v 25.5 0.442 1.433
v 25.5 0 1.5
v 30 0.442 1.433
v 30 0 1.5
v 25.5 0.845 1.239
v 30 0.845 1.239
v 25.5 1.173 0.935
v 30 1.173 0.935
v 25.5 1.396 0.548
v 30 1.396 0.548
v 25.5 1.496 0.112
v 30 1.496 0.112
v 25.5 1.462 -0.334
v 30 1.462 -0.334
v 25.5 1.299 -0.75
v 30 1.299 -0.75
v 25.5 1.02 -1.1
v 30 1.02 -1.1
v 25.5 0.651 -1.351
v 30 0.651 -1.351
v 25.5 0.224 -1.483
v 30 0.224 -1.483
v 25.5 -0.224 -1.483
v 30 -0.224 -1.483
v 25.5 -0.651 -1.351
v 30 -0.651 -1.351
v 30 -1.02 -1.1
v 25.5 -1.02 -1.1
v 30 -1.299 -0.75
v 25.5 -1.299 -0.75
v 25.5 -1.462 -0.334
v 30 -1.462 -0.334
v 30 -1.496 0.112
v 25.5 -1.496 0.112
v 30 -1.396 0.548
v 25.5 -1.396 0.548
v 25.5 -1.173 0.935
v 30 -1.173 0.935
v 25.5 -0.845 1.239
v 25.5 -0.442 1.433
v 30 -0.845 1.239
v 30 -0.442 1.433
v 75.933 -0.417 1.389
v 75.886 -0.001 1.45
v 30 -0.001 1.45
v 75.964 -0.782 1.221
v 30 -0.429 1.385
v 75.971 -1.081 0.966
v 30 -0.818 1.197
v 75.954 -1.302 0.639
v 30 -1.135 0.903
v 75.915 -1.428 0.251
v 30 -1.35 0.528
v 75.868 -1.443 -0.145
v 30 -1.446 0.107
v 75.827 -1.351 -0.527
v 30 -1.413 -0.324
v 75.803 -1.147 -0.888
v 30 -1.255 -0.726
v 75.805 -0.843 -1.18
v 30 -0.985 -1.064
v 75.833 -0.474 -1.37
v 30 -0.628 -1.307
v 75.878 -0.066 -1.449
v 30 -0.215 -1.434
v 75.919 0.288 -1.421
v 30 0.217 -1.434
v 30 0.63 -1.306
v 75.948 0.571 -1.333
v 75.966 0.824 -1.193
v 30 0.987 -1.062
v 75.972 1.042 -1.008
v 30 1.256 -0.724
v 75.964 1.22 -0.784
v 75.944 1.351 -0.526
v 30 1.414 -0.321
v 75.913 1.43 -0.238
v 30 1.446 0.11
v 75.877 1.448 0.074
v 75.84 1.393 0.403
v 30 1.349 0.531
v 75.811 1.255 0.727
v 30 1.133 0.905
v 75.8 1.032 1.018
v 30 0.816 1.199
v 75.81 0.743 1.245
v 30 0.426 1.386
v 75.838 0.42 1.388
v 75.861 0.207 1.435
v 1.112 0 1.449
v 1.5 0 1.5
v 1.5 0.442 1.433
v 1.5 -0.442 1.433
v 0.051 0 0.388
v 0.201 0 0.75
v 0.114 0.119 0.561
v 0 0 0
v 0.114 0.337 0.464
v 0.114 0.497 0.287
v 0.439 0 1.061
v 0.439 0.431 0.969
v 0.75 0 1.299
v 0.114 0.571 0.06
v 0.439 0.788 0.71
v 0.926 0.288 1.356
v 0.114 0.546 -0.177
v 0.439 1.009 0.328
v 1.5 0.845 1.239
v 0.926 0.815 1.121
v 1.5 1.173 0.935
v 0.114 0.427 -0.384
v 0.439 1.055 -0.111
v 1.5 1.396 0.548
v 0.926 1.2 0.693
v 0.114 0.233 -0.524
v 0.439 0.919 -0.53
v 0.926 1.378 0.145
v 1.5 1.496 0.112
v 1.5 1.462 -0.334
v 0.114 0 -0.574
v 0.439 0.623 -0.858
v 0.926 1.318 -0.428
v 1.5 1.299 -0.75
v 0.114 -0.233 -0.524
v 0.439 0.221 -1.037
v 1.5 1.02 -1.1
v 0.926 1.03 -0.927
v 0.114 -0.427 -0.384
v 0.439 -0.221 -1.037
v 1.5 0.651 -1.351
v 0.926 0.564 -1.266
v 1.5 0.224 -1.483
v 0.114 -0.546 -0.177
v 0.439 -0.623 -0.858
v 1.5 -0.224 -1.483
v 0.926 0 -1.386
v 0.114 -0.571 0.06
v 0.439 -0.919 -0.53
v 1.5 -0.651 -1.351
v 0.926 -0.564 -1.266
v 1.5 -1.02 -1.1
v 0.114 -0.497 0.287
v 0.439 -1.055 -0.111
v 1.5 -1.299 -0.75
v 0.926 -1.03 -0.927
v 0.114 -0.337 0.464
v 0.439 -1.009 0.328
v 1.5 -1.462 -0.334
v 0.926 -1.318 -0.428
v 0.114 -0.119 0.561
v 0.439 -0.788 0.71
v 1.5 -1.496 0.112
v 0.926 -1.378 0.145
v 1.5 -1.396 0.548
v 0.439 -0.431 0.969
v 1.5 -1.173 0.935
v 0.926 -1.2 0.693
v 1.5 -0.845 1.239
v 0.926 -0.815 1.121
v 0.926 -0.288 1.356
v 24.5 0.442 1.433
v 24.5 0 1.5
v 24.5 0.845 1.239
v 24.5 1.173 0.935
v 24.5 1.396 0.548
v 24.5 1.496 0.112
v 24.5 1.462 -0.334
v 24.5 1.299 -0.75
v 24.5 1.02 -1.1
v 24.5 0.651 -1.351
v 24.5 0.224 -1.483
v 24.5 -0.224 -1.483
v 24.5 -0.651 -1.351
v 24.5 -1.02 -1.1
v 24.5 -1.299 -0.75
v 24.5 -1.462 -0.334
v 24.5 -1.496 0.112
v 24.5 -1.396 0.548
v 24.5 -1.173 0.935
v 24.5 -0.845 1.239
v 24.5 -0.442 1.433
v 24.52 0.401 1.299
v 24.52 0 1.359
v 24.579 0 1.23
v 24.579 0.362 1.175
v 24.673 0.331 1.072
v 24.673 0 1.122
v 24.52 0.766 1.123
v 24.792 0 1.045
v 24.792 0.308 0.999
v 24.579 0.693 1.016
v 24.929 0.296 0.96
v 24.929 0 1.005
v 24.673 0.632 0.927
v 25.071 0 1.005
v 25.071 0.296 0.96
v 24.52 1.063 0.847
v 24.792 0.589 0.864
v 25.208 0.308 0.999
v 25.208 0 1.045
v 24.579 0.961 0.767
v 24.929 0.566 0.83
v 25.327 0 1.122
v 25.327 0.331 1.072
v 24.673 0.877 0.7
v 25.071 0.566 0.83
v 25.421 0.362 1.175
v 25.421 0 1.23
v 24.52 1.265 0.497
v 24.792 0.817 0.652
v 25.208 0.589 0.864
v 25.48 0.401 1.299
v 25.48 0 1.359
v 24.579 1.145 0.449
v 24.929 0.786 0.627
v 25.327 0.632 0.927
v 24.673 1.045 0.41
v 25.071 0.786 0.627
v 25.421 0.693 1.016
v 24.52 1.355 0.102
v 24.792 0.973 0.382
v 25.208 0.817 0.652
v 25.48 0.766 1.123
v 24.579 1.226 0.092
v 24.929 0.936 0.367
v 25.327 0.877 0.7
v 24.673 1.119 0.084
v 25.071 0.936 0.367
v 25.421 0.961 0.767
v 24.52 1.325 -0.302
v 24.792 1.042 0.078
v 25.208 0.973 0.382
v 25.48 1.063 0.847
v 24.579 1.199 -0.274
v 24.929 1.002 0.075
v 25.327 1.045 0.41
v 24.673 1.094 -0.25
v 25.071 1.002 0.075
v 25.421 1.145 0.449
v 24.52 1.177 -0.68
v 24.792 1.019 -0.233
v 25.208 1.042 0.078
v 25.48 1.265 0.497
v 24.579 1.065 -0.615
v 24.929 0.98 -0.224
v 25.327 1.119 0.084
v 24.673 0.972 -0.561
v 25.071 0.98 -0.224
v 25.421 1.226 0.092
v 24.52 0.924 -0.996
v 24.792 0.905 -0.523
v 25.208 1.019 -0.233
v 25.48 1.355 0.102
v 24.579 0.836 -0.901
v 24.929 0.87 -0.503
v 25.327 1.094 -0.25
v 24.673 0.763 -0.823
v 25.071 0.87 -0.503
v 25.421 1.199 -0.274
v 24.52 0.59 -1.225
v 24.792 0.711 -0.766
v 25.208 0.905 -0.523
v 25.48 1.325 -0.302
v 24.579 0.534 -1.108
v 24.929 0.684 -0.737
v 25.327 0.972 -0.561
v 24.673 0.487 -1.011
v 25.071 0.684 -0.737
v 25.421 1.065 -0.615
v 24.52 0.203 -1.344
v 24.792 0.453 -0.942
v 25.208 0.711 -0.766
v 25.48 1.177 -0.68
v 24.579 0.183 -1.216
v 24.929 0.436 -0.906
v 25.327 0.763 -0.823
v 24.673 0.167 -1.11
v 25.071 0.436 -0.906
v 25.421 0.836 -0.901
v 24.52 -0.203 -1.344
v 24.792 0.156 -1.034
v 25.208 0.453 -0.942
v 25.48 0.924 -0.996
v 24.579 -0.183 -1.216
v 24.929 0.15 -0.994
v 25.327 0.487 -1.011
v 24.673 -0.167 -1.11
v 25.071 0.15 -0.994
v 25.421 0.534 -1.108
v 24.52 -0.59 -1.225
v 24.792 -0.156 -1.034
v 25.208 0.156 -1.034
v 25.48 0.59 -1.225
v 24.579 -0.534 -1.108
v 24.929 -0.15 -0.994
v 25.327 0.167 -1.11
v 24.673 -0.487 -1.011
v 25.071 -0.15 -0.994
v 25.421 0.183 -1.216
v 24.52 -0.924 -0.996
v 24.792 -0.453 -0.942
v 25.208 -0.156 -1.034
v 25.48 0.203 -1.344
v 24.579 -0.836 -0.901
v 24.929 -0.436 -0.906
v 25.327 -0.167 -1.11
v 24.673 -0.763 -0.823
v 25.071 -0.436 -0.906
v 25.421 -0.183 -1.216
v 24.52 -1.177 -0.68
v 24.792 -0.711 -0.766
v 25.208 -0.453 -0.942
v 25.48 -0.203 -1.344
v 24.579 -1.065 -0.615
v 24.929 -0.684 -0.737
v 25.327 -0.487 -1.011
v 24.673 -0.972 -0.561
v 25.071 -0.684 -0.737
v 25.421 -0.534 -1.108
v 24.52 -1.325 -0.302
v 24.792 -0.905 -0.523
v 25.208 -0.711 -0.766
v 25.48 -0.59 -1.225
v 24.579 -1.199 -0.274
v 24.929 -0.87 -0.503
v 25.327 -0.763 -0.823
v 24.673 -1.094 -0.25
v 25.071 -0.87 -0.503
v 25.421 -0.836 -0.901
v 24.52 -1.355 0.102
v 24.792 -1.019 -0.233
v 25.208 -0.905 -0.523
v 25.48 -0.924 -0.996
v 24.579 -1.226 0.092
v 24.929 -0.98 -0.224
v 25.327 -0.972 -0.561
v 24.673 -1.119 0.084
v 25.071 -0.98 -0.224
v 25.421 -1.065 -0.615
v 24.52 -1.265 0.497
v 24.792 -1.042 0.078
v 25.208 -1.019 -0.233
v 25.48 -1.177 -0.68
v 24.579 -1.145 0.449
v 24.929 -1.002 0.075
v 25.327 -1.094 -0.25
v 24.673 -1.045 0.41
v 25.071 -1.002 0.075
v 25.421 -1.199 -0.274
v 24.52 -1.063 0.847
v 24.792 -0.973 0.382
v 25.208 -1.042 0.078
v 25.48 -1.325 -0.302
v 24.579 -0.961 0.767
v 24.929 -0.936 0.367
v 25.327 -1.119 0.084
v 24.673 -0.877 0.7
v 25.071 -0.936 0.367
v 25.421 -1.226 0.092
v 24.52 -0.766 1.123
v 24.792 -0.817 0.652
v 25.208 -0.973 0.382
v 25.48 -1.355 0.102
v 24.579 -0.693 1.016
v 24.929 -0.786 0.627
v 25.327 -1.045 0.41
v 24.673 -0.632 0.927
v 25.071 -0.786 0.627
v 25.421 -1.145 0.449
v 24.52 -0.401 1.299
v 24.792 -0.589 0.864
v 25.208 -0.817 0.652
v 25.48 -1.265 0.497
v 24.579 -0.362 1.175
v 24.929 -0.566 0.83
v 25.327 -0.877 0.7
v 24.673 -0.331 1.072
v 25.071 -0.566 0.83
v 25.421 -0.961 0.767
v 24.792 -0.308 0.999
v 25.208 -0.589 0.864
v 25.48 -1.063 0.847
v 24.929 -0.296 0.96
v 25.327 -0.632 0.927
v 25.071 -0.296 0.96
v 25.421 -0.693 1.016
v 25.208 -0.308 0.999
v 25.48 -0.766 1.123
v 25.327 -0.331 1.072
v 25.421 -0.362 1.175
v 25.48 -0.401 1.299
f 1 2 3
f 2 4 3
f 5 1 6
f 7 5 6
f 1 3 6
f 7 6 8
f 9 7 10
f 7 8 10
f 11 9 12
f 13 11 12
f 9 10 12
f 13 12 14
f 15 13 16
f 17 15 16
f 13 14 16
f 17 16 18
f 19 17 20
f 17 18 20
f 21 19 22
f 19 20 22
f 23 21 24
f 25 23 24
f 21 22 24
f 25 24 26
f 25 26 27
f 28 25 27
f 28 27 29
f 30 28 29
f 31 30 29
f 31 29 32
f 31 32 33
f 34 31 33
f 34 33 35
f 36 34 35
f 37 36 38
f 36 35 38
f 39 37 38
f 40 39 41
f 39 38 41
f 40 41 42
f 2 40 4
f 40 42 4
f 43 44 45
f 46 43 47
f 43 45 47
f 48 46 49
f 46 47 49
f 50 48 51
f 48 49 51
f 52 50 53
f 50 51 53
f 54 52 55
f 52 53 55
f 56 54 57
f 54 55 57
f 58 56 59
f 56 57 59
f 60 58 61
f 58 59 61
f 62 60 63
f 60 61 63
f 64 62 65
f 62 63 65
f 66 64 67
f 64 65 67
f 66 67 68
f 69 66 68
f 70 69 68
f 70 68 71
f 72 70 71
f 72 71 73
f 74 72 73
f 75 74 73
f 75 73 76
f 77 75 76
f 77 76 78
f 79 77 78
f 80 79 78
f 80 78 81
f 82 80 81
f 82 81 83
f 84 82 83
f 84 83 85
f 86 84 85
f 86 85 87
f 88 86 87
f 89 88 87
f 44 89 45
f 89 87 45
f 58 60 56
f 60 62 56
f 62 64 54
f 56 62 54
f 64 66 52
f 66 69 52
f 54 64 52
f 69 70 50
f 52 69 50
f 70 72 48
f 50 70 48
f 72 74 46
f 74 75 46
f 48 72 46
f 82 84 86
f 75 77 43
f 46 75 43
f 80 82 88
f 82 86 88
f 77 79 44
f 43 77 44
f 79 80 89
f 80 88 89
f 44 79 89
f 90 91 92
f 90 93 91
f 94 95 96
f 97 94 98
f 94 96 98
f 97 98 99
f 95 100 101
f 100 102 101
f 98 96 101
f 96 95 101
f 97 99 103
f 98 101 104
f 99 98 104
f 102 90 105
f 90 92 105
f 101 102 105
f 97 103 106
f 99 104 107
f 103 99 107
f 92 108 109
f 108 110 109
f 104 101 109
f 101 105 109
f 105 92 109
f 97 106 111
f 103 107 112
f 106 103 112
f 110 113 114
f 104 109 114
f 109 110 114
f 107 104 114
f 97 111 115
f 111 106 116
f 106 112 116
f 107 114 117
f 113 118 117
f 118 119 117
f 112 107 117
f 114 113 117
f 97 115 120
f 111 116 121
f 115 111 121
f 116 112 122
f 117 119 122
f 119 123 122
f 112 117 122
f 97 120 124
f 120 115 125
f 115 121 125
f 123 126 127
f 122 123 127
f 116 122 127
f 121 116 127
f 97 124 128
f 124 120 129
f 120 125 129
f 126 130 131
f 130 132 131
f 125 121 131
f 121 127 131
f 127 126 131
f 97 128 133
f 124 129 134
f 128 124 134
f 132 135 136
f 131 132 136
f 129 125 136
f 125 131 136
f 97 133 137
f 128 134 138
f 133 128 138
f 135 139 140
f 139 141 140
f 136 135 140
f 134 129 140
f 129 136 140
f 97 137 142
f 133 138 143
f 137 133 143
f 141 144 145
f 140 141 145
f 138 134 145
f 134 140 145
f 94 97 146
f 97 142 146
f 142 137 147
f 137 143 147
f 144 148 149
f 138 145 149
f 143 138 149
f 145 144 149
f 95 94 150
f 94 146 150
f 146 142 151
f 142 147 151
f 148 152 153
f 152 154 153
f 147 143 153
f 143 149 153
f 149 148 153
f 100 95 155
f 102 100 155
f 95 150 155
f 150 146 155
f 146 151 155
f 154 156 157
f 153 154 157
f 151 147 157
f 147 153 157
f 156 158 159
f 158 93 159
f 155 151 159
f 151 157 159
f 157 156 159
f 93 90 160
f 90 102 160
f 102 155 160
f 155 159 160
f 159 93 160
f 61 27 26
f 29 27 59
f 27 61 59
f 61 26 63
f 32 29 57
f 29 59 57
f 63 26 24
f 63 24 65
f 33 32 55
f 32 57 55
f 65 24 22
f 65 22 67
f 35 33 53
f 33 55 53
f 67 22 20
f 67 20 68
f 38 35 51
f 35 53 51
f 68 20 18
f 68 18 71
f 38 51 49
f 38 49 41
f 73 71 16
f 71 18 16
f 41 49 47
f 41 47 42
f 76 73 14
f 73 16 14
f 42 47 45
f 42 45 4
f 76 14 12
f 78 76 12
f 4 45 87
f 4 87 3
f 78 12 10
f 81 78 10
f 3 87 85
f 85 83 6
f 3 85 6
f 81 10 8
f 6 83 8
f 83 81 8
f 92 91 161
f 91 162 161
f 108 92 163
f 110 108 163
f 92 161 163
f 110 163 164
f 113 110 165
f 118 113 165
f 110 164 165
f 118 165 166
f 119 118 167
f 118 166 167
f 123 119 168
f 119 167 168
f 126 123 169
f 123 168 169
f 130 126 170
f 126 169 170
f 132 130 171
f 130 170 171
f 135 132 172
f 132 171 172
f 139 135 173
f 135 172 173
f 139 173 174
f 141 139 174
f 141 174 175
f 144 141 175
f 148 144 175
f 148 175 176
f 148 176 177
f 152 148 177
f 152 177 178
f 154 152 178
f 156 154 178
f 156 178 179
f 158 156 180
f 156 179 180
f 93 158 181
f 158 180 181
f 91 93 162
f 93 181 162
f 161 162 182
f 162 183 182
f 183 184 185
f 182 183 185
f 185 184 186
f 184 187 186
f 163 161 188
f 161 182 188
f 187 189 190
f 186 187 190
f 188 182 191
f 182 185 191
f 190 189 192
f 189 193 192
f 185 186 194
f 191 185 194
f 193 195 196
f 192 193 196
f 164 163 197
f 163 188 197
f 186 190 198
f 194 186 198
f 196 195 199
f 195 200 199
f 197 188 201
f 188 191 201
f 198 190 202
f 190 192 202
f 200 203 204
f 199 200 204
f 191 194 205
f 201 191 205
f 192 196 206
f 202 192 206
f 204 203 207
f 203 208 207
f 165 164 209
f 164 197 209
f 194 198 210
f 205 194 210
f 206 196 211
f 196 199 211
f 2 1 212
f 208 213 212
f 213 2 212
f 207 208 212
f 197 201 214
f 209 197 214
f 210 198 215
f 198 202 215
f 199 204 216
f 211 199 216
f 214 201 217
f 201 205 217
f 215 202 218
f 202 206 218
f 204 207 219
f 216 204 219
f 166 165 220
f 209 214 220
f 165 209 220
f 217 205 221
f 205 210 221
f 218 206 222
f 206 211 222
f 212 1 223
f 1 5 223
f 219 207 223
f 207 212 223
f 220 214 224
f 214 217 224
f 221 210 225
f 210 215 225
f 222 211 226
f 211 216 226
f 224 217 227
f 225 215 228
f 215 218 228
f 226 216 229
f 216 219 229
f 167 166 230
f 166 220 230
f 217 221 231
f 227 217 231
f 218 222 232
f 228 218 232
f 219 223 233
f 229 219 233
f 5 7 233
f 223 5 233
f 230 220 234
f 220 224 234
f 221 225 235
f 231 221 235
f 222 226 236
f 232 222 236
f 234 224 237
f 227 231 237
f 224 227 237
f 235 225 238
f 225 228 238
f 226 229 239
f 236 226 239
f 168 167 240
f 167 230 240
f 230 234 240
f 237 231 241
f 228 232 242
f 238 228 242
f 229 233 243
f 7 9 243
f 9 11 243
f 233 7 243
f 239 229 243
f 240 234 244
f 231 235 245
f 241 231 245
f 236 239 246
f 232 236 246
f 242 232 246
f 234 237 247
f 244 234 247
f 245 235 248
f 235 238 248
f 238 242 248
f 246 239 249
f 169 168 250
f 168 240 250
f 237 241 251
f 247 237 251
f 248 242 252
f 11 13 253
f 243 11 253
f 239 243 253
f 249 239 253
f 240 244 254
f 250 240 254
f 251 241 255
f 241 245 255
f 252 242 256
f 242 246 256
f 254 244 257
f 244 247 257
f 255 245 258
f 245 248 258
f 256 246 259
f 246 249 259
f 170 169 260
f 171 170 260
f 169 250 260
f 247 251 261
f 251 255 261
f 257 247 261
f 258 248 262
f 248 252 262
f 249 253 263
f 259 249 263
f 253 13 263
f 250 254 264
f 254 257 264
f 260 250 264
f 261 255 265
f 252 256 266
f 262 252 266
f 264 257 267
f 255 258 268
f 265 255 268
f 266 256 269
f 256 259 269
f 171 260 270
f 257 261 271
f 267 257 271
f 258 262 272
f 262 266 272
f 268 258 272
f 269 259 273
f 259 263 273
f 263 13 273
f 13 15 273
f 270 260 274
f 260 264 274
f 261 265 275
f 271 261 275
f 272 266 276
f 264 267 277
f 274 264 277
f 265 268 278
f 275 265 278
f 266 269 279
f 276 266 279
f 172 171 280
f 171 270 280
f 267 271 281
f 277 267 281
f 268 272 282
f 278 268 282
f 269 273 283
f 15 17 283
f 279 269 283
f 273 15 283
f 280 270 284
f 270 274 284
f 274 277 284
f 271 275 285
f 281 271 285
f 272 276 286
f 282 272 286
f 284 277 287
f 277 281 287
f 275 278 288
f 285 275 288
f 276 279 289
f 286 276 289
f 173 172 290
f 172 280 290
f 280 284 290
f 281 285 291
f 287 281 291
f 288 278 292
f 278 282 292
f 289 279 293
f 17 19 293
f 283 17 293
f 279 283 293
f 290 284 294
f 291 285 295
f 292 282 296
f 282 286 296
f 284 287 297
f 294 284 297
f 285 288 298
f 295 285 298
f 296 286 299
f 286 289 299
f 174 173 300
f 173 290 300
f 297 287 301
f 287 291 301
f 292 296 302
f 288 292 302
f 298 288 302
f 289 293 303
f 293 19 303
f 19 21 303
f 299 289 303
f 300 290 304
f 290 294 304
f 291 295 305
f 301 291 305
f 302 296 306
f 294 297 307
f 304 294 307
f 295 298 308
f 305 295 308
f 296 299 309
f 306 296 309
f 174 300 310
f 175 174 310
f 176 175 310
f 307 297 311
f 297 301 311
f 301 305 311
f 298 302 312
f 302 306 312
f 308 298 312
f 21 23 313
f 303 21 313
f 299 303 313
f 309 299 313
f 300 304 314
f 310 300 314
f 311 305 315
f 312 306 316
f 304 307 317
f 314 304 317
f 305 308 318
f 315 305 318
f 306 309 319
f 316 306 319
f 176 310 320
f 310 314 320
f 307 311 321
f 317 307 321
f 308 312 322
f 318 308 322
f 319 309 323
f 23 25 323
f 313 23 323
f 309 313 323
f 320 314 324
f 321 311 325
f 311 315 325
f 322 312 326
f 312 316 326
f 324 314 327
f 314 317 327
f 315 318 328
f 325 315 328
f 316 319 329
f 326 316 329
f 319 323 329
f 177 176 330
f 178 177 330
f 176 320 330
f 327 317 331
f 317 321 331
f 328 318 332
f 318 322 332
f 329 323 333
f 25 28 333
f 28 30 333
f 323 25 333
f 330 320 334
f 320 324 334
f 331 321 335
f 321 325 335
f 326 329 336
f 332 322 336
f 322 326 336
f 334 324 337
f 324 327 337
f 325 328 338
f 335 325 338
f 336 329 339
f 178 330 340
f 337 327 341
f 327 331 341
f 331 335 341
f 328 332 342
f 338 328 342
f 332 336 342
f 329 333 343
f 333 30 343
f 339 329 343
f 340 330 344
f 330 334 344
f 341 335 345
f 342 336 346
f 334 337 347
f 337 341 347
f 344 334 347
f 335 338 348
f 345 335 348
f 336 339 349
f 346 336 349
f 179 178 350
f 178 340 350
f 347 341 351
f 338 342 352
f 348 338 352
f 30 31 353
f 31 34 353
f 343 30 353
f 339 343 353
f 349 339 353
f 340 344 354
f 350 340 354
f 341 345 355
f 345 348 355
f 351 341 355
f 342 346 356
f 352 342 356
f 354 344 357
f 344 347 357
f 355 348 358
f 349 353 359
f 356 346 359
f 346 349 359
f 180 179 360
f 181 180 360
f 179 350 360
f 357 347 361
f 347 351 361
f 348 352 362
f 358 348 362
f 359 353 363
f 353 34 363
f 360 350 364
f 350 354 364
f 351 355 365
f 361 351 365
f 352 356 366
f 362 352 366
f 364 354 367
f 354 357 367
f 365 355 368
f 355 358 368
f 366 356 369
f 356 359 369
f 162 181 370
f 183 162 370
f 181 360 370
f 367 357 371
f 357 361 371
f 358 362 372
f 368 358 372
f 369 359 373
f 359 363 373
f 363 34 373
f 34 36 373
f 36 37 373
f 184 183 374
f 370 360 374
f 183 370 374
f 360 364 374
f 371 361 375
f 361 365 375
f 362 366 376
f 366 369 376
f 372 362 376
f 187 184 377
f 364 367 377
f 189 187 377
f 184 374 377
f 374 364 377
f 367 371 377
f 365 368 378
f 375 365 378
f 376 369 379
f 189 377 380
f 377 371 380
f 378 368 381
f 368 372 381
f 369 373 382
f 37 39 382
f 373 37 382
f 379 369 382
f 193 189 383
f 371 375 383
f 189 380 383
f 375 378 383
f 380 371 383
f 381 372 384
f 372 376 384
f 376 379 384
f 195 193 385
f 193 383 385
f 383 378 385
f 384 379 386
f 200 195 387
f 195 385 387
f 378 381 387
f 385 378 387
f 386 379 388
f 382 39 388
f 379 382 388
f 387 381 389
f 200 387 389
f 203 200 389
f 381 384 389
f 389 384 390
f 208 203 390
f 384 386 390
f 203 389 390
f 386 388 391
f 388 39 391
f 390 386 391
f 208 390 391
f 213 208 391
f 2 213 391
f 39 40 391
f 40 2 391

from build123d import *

# Parameters (mm, degrees)
BOSS_EXTRUDE1_REACH      = 46.947
BOSS_EXTRUDE1_END_RADIUS = 6.2
SKETCH2_R                = 1.45


with BuildPart() as part:
    # Sketch1 → Revolve1 (revolve)
    with BuildSketch(Plane(origin=(0, 0, 0), x_dir=(-1, 0, 0), z_dir=(0, 0, -1)), mode=Mode.PRIVATE) as revolve1_sk:
        with BuildLine():
            Line((-30, 1.5), (-30, 0))
            Line((-30, 0), (0, 0))
            ThreePointArc((0, 0), (-0.439339828, 1.060660172), (-1.5, 1.5))
            Line((-1.5, 1.5), (-24.5, 1.5))
            ThreePointArc((-24.5, 1.5), (-25, 1), (-25.5, 1.5))
            Line((-25.5, 1.5), (-30, 1.5))
        make_face()
    revolve(revolve1_sk.sketch.rotate(Axis((30, 0, 0), (-1, 0, 0)), 270), axis=Axis((30, 0, 0), (-1, 0, 0)))

    # Boss-Extrude1: up to this cylinder (the profile starts outside it)
    boss_extrude1_end = Plane(origin=(82, 0, 0), z_dir=(0, 0.7071067811865475, 0.7071067811865476)) * Cylinder(BOSS_EXTRUDE1_END_RADIUS, 107.294, mode=Mode.PRIVATE)
    # Sketch2 → Boss-Extrude1 (add, up to the surface)
    with BuildSketch(Plane(origin=(30, 0, 0), x_dir=(0, 0, -1), z_dir=(1, 0, 0)), mode=Mode.PRIVATE) as boss_extrude1_sk1:
        with Locations(Location((0, 0, 0), (0, 0, 180.053796912))):
            Circle(SKETCH2_R)
    boss_extrude1_tool1 = extrude(boss_extrude1_sk1.sketch, amount=BOSS_EXTRUDE1_REACH, mode=Mode.PRIVATE) - boss_extrude1_end
    add(boss_extrude1_tool1.solids().sort_by_distance((30, 0, 0))[0])


solid = part.part
